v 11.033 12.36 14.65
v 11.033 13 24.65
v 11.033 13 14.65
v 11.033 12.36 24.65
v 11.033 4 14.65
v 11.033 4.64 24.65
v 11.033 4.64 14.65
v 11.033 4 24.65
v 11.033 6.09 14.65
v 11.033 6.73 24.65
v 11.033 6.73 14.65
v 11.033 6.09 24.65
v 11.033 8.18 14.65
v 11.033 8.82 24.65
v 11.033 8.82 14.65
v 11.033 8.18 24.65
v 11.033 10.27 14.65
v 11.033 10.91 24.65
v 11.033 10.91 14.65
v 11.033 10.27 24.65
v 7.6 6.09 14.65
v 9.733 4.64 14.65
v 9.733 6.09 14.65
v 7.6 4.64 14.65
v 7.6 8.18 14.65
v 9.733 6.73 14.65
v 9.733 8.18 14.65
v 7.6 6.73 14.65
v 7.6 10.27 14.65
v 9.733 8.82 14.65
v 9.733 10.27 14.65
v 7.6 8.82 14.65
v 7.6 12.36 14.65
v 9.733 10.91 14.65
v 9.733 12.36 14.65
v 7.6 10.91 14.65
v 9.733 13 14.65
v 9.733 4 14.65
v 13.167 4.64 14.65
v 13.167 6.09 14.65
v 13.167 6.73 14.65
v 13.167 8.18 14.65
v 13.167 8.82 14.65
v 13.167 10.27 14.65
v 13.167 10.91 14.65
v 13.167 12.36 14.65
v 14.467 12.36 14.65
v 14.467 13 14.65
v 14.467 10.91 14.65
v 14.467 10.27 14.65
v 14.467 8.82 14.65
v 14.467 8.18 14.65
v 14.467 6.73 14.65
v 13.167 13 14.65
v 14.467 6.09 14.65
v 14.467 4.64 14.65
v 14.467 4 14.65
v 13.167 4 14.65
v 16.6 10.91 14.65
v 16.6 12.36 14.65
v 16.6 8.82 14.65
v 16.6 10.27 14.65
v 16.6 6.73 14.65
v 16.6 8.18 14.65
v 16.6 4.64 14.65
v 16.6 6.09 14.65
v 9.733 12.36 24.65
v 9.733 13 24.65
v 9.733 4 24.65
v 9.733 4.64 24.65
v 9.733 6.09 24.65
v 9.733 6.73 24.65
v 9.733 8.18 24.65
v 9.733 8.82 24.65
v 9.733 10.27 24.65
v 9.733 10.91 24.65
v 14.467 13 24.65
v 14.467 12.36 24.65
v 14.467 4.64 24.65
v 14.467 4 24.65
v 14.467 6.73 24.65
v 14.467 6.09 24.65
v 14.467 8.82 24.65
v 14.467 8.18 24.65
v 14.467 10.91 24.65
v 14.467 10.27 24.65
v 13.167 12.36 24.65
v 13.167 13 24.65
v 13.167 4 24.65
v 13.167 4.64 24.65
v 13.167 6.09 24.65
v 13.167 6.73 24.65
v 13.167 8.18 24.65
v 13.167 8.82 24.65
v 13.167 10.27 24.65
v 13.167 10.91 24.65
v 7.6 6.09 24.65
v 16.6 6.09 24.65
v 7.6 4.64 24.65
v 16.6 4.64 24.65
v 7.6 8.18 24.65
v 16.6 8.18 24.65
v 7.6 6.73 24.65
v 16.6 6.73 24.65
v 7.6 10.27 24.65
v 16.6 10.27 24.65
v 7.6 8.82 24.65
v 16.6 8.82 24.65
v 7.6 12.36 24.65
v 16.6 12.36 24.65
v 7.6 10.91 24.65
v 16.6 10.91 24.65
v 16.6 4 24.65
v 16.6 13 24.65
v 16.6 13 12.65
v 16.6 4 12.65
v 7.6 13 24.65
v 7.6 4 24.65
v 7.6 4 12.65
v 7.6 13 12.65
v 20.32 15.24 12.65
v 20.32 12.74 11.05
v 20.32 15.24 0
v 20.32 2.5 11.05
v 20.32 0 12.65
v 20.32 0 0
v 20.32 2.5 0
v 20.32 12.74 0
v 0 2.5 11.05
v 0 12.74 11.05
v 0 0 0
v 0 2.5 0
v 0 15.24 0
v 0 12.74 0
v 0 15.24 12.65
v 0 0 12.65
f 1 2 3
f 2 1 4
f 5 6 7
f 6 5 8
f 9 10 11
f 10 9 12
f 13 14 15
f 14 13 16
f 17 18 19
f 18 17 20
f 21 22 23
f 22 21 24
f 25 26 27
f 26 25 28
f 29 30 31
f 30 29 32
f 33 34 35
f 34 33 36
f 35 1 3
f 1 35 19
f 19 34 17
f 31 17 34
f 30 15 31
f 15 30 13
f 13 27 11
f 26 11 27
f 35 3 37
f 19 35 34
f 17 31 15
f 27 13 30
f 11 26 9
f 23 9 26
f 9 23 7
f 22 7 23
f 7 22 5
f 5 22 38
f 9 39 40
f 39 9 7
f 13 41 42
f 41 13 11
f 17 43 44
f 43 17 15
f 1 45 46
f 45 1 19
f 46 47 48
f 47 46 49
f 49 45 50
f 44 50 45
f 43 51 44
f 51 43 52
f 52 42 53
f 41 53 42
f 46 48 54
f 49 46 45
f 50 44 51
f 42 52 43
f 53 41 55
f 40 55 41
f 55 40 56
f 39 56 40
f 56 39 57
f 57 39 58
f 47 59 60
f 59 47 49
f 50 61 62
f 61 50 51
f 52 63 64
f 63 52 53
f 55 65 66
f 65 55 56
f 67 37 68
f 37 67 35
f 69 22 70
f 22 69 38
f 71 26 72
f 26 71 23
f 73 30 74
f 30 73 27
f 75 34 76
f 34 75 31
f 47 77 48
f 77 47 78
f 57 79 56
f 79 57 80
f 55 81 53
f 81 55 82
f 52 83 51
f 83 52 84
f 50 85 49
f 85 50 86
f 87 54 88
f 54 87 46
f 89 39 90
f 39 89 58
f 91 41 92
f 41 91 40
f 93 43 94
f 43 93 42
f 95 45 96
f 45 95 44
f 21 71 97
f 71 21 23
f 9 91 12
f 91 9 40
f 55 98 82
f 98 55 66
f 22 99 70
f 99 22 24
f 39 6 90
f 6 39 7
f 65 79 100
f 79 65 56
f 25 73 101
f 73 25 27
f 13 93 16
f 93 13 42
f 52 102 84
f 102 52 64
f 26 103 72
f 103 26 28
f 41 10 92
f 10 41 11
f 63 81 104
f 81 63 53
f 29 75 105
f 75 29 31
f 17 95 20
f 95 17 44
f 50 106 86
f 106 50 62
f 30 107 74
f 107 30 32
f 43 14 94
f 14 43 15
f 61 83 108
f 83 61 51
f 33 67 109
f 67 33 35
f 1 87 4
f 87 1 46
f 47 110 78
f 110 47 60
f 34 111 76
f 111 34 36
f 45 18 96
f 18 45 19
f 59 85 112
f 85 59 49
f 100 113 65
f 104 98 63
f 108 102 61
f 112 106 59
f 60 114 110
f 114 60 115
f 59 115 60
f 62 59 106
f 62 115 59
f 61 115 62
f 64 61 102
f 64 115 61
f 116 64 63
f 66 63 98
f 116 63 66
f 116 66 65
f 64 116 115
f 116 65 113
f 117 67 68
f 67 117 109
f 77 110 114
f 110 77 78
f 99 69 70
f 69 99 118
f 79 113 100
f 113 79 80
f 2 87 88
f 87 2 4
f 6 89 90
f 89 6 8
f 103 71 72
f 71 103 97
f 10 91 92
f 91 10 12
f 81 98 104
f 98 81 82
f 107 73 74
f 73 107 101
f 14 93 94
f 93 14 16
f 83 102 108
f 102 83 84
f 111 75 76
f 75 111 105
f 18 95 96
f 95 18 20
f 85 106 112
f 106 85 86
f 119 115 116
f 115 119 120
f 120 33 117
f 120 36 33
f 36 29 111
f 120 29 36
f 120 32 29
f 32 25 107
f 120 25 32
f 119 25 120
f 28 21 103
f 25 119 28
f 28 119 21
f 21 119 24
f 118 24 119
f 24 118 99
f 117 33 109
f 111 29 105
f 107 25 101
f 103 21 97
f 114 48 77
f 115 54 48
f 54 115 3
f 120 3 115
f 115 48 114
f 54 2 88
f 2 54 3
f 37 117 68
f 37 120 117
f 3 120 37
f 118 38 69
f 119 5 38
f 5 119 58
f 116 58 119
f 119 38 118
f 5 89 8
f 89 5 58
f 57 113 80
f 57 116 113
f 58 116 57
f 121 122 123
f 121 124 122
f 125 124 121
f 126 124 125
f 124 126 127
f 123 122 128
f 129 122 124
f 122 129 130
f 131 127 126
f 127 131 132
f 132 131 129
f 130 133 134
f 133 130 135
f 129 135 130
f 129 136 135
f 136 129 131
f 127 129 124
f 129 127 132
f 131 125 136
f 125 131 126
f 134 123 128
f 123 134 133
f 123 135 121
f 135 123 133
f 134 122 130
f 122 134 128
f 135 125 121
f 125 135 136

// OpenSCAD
// file: ../settings/dimensions.scad
// Defualt Quality
$fn = 50;

// PCB Dimensions - mm
pcb_l = 109.67;
pcb_w = 84.30;
pcb_t = 1.6;

hole_dia = 3.2;
hole_x_spacing = 101.85;
hole_y_spacing = 76.10;

// PCB Component Locations - mm from center
usb_x = (-pcb_l/2) + 24.11;
usb_y = (-pcb_w/2);

uSD_x = (-pcb_l/2) + 42.46;
uSD_y = (-pcb_w/2) - 0.71;

// TMC2130 Dimensions - mm
tmc_l = 20.32;
tmc_w = 15.24;
tmc_t = 1.6;
tmc_offset_from_pcb = 11.05;


// Global Enclosure Settings
pcb_mnt_pattern = [[0,0],[hole_x_spacing,0],[0,hole_y_spacing],[hole_x_spacing,hole_y_spacing]];
x_clearance = 25;
y_clearance = 15;
m3_clearance_dia = 3.2;
wall_height = 38;
// main file
include <../settings/dimensions.scad>

module tmc2130_pcb() {
    color("DimGrey") {
        cube([tmc_l, tmc_w, tmc_t]);
    }
}

module heatsink() {
    hs_l = 9.0;
    hs_w = 9.0;
    hs_h = 12.0;

    num_fin_y = 5;
    num_fin_x = 3;
    fin_spacing_x = 1.3;
    fin_thickness_x = (hs_l - ((num_fin_x-1)*fin_spacing_x))/num_fin_x;
    fin_spacing_y = 1.45;
    fin_thickness_y = (hs_w - ((num_fin_y-1)*fin_spacing_y))/num_fin_y;

    color("Blue") difference() {
        cube([hs_l, hs_w, hs_h]);

        for (x=[0:num_fin_x-2]) {
            translate([(x+1)*fin_thickness_x+x*fin_spacing_x,-1,2])cube([fin_spacing_x,hs_w+2,hs_h]);
        }

        for (y=[0:num_fin_y-2]) {
            translate([-1,(y+1)*fin_thickness_y+y*fin_spacing_y,2])cube([hs_l+2,fin_spacing_y,hs_h]);
        }
    }
}

module TMC2130() {
    translate([0,0,tmc_offset_from_pcb]) {
        tmc2130_pcb();
        translate([7.6,4,tmc_t])heatsink();

        color("Black") {
            translate([0,0,-tmc_offset_from_pcb])cube([tmc_l, 2.5, tmc_offset_from_pcb]);
            translate([0,tmc_w-2.5,-tmc_offset_from_pcb])cube([tmc_l, 2.5, tmc_offset_from_pcb]);
        }
    }
}

TMC2130();
